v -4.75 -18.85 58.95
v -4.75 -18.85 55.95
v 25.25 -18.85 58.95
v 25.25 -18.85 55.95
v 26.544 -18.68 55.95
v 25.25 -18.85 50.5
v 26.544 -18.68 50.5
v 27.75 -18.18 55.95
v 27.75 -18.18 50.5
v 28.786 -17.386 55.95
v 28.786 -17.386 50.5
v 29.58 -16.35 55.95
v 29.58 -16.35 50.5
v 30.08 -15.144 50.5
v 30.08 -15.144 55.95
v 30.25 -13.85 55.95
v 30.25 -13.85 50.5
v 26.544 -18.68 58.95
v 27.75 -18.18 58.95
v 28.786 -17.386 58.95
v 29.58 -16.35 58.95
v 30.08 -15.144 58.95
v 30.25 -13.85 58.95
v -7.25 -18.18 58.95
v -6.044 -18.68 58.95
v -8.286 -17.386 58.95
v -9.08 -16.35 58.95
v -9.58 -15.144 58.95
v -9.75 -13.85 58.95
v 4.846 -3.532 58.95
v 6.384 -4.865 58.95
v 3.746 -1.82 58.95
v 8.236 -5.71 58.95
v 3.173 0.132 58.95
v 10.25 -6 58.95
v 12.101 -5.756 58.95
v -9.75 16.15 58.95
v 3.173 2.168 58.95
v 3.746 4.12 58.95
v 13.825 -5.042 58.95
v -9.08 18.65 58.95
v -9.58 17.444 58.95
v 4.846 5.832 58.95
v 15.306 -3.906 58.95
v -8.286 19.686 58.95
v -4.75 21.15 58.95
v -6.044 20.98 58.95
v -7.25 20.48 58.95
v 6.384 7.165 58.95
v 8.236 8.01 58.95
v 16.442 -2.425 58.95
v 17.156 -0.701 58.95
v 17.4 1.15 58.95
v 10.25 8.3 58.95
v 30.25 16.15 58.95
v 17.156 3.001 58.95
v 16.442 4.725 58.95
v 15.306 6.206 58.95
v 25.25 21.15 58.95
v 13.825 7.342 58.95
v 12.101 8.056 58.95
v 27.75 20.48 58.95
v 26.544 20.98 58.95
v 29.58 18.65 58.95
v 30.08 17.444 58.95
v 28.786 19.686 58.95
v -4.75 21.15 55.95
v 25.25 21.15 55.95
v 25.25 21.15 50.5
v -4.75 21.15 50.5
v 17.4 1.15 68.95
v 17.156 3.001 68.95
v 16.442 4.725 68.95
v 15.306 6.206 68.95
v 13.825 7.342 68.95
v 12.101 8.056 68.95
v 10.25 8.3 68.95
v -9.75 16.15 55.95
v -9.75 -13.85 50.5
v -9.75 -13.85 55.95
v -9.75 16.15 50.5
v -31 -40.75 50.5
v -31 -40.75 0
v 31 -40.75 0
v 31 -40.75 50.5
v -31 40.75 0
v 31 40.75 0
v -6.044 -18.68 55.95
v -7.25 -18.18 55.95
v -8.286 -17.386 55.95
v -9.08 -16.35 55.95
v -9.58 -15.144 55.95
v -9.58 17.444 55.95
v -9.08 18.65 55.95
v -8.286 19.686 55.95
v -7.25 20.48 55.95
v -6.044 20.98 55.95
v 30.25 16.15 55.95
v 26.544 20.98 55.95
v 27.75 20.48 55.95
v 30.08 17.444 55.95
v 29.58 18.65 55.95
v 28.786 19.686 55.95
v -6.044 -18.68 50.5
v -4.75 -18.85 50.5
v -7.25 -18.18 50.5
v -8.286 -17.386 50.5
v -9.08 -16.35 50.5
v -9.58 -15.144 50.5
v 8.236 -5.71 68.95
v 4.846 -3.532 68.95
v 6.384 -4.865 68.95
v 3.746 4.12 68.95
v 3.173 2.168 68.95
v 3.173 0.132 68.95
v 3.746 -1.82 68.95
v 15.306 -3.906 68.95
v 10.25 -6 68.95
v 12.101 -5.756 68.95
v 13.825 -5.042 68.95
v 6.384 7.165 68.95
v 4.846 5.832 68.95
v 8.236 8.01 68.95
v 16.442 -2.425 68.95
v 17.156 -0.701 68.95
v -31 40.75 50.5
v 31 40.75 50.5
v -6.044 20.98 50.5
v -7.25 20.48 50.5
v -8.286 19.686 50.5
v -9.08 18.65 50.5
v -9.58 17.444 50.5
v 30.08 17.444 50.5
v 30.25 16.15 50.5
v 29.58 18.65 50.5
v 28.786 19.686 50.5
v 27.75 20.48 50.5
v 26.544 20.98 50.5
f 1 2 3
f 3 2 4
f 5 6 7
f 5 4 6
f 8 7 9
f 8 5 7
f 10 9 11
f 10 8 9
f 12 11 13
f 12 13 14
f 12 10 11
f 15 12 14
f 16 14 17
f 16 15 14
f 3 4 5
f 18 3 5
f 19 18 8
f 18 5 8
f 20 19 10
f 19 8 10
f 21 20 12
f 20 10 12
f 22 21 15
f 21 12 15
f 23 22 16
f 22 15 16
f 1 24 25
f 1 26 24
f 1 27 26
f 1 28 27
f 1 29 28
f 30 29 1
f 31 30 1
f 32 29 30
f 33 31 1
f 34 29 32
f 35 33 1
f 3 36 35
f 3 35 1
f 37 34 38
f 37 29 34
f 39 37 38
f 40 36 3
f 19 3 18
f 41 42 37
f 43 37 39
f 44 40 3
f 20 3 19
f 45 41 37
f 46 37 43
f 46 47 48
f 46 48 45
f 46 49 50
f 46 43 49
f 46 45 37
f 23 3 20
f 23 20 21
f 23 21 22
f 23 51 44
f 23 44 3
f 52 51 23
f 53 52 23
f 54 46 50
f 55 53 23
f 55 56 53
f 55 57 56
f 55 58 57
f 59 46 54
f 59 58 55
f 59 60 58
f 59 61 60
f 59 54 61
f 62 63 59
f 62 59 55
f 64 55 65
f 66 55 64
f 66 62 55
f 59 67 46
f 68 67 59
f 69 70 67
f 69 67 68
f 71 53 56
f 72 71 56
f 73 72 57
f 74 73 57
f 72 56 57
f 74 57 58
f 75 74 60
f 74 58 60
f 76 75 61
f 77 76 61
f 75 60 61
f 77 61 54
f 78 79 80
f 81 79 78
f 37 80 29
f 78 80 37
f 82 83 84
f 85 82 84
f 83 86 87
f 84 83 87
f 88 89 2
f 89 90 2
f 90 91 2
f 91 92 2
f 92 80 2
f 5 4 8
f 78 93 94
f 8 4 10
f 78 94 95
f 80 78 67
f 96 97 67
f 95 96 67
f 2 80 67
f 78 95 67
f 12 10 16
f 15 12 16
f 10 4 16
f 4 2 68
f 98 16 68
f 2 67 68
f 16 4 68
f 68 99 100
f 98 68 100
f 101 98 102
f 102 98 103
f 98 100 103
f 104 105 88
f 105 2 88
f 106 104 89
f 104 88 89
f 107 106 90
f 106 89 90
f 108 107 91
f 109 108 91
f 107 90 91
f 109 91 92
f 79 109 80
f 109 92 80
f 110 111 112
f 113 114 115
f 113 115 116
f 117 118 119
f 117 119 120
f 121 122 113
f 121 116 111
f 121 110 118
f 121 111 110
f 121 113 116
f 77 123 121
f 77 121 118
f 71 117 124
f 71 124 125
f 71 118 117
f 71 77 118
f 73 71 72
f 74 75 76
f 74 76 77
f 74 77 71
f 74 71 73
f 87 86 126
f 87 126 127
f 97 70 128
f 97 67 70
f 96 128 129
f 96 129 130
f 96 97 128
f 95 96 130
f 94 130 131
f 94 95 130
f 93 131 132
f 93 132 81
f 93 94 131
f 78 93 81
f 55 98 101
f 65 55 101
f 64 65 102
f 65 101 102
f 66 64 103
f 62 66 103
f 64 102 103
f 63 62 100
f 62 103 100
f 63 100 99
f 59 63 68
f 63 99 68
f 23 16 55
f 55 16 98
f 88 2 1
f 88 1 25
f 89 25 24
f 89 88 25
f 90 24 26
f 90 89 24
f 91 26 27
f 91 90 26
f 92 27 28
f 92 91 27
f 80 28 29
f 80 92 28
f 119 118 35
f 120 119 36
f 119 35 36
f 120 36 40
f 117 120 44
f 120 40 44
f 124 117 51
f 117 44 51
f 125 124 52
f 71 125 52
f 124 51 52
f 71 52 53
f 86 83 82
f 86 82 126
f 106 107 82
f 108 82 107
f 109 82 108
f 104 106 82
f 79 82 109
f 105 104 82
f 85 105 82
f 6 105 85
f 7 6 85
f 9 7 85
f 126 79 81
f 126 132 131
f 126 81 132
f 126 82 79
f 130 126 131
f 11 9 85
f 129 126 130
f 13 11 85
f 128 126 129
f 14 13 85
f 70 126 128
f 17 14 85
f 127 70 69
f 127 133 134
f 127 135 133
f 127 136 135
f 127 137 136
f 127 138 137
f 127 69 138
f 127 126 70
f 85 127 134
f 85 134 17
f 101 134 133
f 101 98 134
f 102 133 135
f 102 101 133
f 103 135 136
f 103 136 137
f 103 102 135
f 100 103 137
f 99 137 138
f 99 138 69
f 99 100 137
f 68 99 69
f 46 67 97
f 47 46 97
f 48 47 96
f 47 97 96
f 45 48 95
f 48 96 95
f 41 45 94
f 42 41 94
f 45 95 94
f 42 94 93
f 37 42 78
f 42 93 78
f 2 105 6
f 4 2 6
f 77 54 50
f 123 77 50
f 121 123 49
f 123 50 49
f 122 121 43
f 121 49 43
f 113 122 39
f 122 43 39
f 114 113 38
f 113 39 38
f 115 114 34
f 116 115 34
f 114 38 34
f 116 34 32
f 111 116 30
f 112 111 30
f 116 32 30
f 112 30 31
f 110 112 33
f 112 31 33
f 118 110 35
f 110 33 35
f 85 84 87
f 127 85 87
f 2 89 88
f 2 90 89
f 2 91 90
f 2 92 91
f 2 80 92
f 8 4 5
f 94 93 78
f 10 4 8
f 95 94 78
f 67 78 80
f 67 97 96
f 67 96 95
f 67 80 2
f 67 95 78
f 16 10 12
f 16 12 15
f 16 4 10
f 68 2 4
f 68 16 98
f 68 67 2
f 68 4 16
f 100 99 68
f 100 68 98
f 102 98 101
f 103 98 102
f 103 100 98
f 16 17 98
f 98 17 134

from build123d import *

# Parameters (mm, degrees)
F0_W     = 62
F0_H     = 81.5
F1_DEPTH = 50.5
F2_W     = 40
F2_H     = 40
F3_DEPTH = 5.45
F4_R     = 5
F5_DEPTH = 3
F7_DEPTH = 10


# Not quite as in the source:
# - a feature of the source that left no trace in its solid (it failed there, or was rolled back) is left out


with BuildPart() as f1:
    # F0 (on Top) → F1 (new body)
    with BuildSketch(Plane.XY):
        Rectangle(F0_W, F0_H)
    extrude(amount=F1_DEPTH)

    # F2 (on face) → F3 (join)
    with BuildSketch(Plane.XY.offset(50.5)):
        with Locations((10.25, 1.15)):
            Rectangle(F2_W, F2_H)
    extrude(amount=F3_DEPTH)

    # F4
    f4_edges = [f1.edges().sort_by_distance(p)[0] for p in [
        (-9.75, 21.15, 53.225),
        (-9.75, -18.85, 53.225),
        (30.25, -18.85, 53.225),
        (30.25, 21.15, 53.225),
    ]]
    fillet(f4_edges, radius=F4_R)


with BuildPart() as f5:
    # F5 (new): a face of the model
    f5_faces = [f1.part.faces().sort_by_distance(p)[0] for p in [
        (10.25, 1.15, 55.95),
    ]]
    extrude(f5_faces, amount=F5_DEPTH)

    # F6 (on face) → F7 (join)
    with BuildSketch(Plane.XY.offset(58.95)):
        with BuildLine():
            ThreePointArc((17.4, 1.15), (15.3058134855, 6.2058134855), (10.25, 8.3))
            Line((10.25, 8.3), (10.25, -6))
            ThreePointArc((10.25, -6), (15.3058134855, -3.9058134855), (17.4, 1.15))
        make_face()
        with BuildLine():
            Line((10.25, -6), (10.25, 8.3))
            ThreePointArc((10.25, 8.3), (3.1, 1.15), (10.25, -6))
        make_face()
    extrude(amount=F7_DEPTH)


solid = Compound([f1.part, f5.part])
